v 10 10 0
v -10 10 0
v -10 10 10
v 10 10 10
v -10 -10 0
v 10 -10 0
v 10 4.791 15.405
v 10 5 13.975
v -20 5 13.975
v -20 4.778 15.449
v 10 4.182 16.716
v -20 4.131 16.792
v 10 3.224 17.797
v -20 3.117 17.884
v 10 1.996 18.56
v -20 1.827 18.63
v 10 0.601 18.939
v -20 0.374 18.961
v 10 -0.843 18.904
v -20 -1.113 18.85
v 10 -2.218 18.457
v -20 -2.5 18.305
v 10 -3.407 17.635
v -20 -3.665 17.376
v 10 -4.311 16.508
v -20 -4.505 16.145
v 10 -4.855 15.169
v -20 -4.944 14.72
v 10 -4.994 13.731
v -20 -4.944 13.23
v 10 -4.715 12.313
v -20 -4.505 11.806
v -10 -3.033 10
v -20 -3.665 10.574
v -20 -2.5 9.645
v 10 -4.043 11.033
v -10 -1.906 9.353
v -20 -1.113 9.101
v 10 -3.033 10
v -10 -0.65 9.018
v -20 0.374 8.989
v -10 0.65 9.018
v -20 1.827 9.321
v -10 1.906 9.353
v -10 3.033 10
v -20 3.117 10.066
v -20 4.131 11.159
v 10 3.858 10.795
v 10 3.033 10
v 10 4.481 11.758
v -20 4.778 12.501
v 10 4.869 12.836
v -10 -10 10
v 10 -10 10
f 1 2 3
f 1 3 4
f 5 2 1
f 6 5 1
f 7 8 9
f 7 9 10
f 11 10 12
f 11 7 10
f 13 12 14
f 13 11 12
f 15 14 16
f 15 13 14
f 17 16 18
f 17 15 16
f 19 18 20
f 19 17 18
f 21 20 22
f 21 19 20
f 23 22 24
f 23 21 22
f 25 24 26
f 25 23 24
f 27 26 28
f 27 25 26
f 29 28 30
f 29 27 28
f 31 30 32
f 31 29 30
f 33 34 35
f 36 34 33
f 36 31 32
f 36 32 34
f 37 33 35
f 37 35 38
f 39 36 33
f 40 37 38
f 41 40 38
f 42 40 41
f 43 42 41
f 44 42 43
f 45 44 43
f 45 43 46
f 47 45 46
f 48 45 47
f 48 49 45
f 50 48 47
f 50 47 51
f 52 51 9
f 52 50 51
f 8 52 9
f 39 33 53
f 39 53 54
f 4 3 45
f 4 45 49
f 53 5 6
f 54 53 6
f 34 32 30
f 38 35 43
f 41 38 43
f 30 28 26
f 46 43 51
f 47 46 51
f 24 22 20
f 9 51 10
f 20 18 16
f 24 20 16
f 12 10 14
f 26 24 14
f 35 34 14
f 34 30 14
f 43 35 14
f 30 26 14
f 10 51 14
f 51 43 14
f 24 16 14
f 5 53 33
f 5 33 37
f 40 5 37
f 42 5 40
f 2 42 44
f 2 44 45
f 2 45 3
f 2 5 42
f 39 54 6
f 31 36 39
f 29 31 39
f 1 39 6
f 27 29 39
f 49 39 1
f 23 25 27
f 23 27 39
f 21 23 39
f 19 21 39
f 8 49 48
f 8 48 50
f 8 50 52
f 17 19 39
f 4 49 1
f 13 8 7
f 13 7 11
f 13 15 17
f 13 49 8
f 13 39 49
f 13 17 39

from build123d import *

# Parameters (mm, degrees)
F0_W     = 20
F0_H     = 20
F1_DEPTH = 10
F2_R     = 5
F3_DEPTH = 30


with BuildPart() as f1:
    # F0 (on Top) → F1 (new body)
    with BuildSketch(Plane.XY):
        Rectangle(F0_W, F0_H)
    extrude(amount=F1_DEPTH)

    # F2 (on face) → F3 (join)
    with BuildSketch(Plane.YZ.offset(10)):
        with Locations((0, 13.975238)):
            Circle(F2_R)
    extrude(amount=-F3_DEPTH)


solid = f1.part
